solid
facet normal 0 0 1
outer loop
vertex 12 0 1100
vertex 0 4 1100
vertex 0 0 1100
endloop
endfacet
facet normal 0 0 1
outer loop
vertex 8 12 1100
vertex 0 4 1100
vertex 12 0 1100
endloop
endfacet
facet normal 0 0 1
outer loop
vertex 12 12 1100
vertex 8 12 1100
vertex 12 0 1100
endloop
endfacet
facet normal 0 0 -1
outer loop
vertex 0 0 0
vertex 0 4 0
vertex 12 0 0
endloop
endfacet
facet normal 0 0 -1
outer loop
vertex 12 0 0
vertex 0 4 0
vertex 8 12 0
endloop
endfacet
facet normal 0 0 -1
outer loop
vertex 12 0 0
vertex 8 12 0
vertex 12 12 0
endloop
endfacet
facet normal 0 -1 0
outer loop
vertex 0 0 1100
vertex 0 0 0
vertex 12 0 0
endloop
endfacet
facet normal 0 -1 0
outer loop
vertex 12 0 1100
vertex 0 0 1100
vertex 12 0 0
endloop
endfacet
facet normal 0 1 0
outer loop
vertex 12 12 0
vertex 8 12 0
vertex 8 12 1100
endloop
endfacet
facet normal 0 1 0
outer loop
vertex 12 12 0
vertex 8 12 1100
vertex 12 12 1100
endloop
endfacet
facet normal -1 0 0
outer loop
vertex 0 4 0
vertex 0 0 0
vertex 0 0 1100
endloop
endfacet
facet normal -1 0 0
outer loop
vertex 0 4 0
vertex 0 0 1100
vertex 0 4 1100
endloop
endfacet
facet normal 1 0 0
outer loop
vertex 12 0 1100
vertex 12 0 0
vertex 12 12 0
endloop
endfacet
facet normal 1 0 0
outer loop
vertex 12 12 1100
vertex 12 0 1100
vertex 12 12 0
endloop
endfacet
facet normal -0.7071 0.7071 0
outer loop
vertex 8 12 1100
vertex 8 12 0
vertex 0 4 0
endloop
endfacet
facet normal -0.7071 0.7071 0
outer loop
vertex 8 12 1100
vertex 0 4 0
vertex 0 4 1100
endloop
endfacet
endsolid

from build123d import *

# Parameters (mm, degrees)
ESQUISSE1_W        = 12
ESQUISSE1_H        = 12
BOSS_EXTRU_1_DEPTH = 1100
CHANFREIN1_SIZE    = 8


with BuildPart() as part:
    # Esquisse1 → Boss.-Extru.1 (new body)
    with BuildSketch(Plane.XY):
        with Locations((6, 6)):
            Rectangle(ESQUISSE1_W, ESQUISSE1_H)
    extrude(amount=BOSS_EXTRU_1_DEPTH)

    # Chanfrein1
    chanfrein1_edges = [part.edges().sort_by_distance(p)[0] for p in [
        (0, 12, 550),
    ]]
    chamfer(chanfrein1_edges, length=CHANFREIN1_SIZE)


solid = part.part
